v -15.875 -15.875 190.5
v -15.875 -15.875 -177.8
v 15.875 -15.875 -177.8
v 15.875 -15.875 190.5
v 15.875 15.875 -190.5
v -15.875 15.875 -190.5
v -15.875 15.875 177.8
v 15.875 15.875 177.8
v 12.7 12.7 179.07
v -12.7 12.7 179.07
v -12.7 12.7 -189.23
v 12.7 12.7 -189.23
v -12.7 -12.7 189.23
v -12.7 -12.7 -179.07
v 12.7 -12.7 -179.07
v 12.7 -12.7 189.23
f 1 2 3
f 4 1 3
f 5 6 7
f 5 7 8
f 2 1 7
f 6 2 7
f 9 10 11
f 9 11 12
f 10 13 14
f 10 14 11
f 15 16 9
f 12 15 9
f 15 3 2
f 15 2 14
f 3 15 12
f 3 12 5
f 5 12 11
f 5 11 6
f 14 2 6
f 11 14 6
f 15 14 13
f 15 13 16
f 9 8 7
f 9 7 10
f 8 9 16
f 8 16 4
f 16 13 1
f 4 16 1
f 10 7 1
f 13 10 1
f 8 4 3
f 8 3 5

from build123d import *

# Parameters (mm, degrees)
F0_W     = 31.75
F0_H     = 31.75
F0_W_2   = 25.4
F0_H_2   = 25.4
F1_DEPTH = 190.5
F3_DEPTH = 31.75
F5_DEPTH = 31.75


with BuildPart() as f1:
    # F0 (on Top) → F1 (new body, symmetric)
    with BuildSketch(Plane.XY):
        Rectangle(F0_W, F0_H)
        Rectangle(F0_W_2, F0_H_2, mode=Mode.SUBTRACT)
    extrude(amount=F1_DEPTH, both=True)

    # F2 (on face) → F3 (cut)
    with BuildSketch(Plane(origin=(-15.875, 0, 0), x_dir=(0, -1, 0), z_dir=(-1, 0, 0))):
        Polygon((15.875, 190.5), (-15.875, 190.5), (-15.875, 177.8), align=None)
    extrude(amount=-F3_DEPTH, mode=Mode.SUBTRACT)

    # F4 (on face) → F5 (cut)
    with BuildSketch(Plane(origin=(-15.875, 0, 0), x_dir=(0, -1, 0), z_dir=(-1, 0, 0))):
        Polygon((-15.875, -190.5), (15.875, -190.5), (15.875, -177.8), align=None)
    extrude(amount=-F5_DEPTH, mode=Mode.SUBTRACT)


solid = f1.part
